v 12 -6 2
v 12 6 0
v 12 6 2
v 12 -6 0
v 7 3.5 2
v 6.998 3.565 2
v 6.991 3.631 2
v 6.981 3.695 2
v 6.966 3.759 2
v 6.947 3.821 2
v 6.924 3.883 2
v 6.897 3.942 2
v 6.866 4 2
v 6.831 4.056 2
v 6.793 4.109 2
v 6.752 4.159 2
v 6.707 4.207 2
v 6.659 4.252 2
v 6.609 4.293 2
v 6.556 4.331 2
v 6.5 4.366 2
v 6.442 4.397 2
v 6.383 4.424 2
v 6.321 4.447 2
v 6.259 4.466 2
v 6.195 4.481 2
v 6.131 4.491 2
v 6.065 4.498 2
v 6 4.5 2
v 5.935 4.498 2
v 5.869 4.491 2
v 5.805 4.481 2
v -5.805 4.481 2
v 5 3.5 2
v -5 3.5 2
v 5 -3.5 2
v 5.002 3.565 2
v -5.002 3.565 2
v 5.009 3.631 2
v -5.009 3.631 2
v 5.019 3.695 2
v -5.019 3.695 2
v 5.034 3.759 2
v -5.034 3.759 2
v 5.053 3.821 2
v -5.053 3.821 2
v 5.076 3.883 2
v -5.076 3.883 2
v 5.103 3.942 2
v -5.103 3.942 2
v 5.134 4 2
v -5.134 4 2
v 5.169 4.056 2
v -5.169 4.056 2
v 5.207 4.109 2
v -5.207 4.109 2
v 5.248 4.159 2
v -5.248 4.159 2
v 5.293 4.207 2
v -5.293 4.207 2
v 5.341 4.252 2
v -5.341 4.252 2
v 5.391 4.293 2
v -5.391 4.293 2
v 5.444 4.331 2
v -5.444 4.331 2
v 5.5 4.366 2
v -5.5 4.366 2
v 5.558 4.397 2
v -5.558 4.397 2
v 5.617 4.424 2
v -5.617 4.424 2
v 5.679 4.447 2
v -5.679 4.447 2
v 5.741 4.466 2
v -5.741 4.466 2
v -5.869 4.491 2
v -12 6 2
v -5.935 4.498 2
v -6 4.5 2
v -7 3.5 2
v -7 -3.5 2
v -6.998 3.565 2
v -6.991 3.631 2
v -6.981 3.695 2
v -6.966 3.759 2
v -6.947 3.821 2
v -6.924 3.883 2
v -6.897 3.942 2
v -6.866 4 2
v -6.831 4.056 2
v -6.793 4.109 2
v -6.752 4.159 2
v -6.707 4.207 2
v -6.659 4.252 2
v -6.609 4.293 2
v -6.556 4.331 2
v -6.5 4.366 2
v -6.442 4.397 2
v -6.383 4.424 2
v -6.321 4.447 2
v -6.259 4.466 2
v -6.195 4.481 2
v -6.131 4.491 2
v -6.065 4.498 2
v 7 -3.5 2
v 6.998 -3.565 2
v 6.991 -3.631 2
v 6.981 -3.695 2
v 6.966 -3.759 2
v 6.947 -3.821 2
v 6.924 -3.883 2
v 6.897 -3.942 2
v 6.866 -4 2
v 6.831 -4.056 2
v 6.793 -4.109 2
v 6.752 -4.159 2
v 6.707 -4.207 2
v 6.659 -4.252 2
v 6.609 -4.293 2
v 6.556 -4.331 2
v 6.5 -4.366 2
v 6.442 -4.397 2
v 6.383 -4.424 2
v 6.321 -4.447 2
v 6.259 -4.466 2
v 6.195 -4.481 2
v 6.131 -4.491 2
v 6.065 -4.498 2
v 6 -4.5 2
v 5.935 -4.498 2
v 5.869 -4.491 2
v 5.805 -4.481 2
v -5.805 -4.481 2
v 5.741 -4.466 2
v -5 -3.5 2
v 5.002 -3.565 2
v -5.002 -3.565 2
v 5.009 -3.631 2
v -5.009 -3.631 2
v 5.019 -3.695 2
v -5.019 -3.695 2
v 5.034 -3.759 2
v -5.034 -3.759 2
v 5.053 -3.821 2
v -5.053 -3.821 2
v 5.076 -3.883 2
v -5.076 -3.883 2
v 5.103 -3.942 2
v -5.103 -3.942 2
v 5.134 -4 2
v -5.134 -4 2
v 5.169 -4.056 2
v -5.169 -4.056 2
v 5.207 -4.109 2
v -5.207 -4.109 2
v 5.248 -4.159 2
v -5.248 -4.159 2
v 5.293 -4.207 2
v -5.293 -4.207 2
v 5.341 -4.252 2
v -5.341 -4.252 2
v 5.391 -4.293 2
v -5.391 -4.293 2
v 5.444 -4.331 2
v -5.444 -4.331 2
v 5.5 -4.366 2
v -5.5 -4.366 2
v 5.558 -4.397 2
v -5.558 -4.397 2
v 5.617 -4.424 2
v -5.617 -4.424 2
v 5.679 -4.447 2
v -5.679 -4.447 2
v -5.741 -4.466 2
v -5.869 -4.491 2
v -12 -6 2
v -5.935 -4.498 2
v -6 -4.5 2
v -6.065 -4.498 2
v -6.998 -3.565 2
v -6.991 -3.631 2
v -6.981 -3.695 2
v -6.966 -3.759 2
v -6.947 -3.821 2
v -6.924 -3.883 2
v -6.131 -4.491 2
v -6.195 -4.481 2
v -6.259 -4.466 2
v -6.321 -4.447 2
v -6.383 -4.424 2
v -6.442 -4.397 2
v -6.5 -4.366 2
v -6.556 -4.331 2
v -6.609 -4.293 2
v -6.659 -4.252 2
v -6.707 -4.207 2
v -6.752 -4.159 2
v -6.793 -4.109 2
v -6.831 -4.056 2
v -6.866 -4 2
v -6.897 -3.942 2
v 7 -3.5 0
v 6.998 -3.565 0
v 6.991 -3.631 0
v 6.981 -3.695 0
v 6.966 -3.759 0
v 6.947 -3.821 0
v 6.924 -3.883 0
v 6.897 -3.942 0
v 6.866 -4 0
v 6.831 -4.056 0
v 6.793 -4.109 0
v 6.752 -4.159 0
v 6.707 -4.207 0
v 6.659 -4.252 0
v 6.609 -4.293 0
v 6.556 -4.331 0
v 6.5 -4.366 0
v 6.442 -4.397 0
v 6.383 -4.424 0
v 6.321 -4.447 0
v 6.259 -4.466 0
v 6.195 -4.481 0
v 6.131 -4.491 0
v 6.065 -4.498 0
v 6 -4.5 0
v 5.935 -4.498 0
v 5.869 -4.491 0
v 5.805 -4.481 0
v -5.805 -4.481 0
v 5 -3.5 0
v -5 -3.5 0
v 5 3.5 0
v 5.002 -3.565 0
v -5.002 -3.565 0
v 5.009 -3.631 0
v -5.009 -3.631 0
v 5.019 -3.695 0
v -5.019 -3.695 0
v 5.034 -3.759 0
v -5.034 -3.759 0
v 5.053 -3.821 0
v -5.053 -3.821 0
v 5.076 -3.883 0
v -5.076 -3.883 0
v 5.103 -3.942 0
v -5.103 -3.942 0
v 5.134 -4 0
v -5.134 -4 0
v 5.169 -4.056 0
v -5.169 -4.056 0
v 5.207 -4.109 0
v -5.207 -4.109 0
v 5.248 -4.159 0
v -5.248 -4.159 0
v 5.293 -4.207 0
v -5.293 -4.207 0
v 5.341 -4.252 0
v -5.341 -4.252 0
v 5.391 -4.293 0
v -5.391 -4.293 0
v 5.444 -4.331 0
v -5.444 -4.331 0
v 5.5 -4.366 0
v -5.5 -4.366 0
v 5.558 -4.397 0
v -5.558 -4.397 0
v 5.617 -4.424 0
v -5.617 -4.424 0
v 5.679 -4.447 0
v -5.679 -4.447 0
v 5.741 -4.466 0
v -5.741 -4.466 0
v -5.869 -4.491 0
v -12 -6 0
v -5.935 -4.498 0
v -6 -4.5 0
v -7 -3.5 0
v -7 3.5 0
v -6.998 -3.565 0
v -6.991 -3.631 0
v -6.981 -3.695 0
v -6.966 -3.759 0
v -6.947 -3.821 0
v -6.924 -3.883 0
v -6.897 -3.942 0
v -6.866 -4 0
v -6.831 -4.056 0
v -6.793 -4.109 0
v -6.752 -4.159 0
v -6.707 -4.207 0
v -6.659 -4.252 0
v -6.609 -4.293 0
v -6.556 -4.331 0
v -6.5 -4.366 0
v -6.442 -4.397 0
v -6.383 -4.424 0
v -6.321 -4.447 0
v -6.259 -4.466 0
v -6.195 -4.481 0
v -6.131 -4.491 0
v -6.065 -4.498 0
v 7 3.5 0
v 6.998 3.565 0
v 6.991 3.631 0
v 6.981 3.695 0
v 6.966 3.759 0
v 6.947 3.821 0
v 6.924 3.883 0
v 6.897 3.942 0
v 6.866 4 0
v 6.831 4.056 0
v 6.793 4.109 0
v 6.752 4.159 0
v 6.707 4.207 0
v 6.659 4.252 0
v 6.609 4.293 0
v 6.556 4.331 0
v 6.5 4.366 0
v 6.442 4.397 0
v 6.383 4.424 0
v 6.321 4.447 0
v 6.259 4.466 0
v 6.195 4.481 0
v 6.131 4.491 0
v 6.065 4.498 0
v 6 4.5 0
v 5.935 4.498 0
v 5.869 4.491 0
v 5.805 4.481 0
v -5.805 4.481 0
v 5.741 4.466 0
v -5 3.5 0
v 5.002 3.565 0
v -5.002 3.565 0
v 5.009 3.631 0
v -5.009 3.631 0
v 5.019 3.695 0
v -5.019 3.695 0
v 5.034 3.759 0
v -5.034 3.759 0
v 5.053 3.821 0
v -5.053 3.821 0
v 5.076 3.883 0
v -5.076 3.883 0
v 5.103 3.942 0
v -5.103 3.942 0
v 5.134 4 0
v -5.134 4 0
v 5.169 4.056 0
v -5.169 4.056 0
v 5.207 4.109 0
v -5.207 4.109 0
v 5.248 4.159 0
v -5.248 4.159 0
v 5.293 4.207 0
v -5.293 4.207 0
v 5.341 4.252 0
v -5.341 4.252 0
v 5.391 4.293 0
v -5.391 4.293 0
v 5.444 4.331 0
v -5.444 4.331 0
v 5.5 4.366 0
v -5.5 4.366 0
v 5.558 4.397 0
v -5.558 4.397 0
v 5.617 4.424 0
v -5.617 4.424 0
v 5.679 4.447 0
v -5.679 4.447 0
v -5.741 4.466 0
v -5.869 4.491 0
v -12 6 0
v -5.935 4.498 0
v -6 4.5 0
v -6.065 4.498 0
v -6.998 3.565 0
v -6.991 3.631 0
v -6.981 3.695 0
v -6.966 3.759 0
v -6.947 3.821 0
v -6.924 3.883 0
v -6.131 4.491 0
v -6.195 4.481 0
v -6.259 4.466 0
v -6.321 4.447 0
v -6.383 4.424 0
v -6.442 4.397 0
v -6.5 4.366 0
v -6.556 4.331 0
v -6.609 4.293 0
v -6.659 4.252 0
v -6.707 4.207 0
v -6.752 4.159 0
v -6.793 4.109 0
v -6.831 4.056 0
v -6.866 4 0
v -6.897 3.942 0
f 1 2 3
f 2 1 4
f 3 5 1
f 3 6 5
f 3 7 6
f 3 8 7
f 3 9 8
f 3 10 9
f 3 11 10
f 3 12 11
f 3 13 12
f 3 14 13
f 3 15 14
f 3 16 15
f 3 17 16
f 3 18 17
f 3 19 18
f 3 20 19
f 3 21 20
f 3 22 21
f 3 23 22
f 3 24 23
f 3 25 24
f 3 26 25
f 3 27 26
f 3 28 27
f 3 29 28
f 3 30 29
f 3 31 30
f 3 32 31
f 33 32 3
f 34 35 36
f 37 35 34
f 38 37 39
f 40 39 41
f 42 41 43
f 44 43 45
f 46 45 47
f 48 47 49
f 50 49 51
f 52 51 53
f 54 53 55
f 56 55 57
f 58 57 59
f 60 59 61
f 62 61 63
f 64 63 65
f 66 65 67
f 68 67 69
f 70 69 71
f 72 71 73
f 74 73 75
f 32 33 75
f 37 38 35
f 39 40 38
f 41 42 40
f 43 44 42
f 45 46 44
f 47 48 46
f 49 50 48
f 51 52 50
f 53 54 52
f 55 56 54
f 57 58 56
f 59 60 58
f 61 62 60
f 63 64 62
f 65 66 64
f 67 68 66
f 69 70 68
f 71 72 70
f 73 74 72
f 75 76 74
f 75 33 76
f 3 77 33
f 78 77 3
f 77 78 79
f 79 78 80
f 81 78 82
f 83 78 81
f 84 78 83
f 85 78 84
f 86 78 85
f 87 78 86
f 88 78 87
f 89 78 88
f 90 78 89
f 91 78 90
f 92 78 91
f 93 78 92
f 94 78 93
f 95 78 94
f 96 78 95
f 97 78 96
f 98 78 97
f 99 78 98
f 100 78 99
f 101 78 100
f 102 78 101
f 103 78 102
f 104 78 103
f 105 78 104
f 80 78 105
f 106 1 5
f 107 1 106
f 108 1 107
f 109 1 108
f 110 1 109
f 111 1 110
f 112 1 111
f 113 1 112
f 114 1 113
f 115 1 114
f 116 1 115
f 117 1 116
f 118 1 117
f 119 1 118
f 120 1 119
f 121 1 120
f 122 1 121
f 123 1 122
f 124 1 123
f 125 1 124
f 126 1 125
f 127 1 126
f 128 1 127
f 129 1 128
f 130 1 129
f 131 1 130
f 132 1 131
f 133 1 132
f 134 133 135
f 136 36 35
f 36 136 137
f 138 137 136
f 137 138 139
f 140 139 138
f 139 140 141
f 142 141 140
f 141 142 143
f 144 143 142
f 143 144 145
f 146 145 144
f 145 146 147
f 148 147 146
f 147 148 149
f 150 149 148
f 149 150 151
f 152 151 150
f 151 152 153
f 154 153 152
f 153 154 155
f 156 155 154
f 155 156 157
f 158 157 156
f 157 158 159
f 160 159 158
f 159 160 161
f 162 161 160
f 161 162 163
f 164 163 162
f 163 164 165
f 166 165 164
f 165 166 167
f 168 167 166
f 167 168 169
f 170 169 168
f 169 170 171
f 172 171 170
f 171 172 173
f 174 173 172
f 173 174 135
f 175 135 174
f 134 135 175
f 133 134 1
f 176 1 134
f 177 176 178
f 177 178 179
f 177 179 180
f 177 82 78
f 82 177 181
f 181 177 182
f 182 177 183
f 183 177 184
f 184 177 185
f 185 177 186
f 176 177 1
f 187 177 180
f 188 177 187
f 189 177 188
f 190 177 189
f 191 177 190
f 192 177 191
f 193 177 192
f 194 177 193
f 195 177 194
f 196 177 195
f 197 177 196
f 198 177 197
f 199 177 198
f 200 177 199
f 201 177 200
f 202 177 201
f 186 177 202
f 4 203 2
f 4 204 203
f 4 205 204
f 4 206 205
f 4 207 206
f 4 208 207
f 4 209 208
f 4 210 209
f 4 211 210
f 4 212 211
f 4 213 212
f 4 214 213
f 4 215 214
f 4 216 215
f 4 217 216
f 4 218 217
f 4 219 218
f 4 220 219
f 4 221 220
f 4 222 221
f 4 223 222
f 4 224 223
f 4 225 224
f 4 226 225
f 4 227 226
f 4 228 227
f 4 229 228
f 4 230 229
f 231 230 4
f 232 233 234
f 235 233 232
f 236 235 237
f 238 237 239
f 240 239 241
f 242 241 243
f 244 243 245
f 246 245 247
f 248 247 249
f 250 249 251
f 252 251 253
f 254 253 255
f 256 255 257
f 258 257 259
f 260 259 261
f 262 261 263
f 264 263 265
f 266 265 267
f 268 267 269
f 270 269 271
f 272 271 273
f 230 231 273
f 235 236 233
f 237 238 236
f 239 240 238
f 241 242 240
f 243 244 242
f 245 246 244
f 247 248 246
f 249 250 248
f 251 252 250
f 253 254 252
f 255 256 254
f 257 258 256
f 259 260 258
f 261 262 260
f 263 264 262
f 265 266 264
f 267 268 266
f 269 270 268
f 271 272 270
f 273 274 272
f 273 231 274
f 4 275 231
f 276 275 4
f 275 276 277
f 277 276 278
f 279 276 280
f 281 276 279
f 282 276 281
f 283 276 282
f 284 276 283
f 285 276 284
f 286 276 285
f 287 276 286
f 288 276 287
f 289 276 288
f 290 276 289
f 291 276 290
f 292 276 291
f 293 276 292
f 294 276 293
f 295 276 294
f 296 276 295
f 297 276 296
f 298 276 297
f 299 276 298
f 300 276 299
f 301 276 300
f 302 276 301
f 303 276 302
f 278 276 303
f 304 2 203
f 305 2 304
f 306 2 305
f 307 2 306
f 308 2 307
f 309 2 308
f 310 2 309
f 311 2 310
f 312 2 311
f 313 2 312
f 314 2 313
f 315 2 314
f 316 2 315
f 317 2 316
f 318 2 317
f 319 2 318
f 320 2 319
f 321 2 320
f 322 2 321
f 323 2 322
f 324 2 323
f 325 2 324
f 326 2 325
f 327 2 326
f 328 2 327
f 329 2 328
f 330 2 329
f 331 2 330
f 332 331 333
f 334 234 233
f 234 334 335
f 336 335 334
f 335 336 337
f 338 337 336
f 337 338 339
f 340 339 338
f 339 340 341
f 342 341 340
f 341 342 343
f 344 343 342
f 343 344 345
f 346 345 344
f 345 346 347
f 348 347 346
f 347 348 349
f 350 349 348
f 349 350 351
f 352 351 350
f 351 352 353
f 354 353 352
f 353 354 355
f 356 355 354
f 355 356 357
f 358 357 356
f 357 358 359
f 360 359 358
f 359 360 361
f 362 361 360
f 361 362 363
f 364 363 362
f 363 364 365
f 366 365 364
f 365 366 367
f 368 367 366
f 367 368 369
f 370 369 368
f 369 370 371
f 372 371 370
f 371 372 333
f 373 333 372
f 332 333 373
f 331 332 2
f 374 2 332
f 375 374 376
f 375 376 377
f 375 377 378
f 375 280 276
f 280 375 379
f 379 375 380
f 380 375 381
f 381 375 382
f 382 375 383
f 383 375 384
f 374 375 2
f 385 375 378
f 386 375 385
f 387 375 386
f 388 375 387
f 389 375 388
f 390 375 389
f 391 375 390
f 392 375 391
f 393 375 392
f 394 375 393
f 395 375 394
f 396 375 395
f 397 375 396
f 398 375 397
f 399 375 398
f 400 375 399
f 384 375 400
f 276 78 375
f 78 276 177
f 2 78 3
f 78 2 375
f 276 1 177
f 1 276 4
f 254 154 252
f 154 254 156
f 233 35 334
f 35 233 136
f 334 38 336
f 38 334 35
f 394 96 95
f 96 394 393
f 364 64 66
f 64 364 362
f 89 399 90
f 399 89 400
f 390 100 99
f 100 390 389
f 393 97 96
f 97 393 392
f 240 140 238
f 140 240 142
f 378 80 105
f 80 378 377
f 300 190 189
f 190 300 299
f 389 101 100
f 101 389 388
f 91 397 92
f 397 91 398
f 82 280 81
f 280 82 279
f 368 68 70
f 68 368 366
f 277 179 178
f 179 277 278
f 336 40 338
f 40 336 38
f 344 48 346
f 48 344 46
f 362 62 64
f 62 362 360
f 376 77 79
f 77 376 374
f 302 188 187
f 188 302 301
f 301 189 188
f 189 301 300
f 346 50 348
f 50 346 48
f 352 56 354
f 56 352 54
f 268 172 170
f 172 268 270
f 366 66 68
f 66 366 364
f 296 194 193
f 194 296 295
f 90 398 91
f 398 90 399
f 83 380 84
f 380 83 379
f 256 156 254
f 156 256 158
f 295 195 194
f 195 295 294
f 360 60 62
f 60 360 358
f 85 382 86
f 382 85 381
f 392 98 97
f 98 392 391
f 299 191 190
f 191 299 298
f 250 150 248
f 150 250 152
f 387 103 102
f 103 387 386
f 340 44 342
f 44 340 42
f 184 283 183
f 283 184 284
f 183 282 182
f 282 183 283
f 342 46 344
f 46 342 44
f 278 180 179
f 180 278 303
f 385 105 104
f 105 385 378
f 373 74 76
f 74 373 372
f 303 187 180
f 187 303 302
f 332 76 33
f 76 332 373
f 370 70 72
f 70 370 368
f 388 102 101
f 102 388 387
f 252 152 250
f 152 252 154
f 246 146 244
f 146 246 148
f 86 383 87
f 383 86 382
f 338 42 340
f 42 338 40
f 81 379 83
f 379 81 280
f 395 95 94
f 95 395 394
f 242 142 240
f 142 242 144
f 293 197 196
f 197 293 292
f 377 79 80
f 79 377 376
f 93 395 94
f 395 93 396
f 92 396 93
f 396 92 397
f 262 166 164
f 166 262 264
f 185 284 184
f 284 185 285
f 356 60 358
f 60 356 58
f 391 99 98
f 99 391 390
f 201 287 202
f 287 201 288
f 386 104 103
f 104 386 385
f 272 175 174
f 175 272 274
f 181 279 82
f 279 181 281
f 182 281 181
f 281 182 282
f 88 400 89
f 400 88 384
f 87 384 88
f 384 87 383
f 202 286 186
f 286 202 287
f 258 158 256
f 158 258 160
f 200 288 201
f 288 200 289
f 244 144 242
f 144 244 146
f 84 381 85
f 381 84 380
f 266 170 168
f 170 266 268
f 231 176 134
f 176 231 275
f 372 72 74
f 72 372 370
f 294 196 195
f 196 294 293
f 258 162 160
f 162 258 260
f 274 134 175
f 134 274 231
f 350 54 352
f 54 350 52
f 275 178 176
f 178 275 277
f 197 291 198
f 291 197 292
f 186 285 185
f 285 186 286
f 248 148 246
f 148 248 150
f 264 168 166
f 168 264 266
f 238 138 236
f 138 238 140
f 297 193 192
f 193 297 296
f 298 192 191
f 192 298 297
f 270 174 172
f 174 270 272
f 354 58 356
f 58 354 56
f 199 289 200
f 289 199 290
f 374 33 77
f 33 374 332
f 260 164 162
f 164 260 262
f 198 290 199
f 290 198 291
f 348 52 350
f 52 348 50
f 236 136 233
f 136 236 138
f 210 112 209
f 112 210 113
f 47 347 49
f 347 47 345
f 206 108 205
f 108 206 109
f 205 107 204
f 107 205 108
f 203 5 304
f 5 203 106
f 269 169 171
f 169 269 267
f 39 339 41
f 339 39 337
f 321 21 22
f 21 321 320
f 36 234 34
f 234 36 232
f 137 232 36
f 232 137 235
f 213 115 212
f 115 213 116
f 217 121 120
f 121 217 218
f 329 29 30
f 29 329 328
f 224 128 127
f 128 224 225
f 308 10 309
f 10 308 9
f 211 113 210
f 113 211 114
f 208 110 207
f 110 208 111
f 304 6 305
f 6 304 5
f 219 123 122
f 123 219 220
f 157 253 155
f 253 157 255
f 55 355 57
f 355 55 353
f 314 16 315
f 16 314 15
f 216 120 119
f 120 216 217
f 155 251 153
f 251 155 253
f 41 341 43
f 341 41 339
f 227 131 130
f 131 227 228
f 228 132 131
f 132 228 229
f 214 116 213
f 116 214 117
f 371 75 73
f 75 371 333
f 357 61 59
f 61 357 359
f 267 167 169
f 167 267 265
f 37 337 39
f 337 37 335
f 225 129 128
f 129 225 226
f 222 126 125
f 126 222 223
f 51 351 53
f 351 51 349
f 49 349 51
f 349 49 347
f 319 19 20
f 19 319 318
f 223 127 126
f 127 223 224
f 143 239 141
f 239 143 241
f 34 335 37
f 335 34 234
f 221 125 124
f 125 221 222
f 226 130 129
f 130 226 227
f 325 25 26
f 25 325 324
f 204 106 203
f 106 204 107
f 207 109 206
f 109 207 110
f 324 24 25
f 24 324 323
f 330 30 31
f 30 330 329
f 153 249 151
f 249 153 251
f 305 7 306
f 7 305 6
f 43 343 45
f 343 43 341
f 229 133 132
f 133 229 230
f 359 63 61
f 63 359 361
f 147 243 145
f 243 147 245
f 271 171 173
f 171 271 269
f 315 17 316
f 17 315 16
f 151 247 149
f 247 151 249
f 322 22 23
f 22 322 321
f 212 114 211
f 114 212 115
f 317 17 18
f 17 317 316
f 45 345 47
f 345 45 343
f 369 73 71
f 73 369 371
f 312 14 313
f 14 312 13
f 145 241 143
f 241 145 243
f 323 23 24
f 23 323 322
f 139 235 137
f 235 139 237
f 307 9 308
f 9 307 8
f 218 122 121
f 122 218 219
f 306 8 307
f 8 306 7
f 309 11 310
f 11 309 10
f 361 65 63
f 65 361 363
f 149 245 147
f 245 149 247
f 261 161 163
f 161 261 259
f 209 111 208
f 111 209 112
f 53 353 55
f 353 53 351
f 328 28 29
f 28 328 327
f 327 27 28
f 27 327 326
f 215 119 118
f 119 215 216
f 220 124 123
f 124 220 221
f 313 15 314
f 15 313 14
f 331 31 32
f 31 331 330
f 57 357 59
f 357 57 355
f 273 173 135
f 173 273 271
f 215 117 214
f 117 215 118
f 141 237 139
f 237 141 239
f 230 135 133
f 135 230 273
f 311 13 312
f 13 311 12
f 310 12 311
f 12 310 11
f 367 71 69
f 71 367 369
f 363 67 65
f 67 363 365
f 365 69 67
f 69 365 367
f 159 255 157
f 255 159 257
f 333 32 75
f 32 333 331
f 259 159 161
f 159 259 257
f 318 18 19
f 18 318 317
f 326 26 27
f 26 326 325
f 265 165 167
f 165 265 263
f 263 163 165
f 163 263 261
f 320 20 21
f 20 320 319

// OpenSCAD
// Auto-generated from tests/data/feature_fixtures_manifest.json
// fixture: plate_two_slots
// fixture_type: plate
// description: Two parallel Y-direction slots on a plate. Tests multi-slot counting.
$fn = 96;

plate_size = [24.000000, 12.000000, 2.000000];
plate_origin = [-12.000000, -6.000000, 0.000000];

module through_hole(center, diameter, height) {
  translate(center) cylinder(d=diameter, h=height, center=false);
}

module through_slot(start, end, width, height) {
  hull() {
    through_hole(start, width, height);
    through_hole(end, width, height);
  }
}

module counterbore_hole(center, through_d, bore_d, bore_depth, plate_thickness) {
  translate([center[0], center[1], -0.1])
    cylinder(d=through_d, h=plate_thickness + 0.2, center=false);
  translate([center[0], center[1], plate_thickness - bore_depth])
    cylinder(d=bore_d, h=bore_depth + 0.1, center=false);
}

difference() {
  translate(plate_origin) cube(plate_size);
  through_slot([-6.000000, -3.500000, -0.100000], [-6.000000, 3.500000, -0.100000], 2.000000, 2.200000);  // slot_0
  through_slot([6.000000, -3.500000, -0.100000], [6.000000, 3.500000, -0.100000], 2.000000, 2.200000);  // slot_1
}
